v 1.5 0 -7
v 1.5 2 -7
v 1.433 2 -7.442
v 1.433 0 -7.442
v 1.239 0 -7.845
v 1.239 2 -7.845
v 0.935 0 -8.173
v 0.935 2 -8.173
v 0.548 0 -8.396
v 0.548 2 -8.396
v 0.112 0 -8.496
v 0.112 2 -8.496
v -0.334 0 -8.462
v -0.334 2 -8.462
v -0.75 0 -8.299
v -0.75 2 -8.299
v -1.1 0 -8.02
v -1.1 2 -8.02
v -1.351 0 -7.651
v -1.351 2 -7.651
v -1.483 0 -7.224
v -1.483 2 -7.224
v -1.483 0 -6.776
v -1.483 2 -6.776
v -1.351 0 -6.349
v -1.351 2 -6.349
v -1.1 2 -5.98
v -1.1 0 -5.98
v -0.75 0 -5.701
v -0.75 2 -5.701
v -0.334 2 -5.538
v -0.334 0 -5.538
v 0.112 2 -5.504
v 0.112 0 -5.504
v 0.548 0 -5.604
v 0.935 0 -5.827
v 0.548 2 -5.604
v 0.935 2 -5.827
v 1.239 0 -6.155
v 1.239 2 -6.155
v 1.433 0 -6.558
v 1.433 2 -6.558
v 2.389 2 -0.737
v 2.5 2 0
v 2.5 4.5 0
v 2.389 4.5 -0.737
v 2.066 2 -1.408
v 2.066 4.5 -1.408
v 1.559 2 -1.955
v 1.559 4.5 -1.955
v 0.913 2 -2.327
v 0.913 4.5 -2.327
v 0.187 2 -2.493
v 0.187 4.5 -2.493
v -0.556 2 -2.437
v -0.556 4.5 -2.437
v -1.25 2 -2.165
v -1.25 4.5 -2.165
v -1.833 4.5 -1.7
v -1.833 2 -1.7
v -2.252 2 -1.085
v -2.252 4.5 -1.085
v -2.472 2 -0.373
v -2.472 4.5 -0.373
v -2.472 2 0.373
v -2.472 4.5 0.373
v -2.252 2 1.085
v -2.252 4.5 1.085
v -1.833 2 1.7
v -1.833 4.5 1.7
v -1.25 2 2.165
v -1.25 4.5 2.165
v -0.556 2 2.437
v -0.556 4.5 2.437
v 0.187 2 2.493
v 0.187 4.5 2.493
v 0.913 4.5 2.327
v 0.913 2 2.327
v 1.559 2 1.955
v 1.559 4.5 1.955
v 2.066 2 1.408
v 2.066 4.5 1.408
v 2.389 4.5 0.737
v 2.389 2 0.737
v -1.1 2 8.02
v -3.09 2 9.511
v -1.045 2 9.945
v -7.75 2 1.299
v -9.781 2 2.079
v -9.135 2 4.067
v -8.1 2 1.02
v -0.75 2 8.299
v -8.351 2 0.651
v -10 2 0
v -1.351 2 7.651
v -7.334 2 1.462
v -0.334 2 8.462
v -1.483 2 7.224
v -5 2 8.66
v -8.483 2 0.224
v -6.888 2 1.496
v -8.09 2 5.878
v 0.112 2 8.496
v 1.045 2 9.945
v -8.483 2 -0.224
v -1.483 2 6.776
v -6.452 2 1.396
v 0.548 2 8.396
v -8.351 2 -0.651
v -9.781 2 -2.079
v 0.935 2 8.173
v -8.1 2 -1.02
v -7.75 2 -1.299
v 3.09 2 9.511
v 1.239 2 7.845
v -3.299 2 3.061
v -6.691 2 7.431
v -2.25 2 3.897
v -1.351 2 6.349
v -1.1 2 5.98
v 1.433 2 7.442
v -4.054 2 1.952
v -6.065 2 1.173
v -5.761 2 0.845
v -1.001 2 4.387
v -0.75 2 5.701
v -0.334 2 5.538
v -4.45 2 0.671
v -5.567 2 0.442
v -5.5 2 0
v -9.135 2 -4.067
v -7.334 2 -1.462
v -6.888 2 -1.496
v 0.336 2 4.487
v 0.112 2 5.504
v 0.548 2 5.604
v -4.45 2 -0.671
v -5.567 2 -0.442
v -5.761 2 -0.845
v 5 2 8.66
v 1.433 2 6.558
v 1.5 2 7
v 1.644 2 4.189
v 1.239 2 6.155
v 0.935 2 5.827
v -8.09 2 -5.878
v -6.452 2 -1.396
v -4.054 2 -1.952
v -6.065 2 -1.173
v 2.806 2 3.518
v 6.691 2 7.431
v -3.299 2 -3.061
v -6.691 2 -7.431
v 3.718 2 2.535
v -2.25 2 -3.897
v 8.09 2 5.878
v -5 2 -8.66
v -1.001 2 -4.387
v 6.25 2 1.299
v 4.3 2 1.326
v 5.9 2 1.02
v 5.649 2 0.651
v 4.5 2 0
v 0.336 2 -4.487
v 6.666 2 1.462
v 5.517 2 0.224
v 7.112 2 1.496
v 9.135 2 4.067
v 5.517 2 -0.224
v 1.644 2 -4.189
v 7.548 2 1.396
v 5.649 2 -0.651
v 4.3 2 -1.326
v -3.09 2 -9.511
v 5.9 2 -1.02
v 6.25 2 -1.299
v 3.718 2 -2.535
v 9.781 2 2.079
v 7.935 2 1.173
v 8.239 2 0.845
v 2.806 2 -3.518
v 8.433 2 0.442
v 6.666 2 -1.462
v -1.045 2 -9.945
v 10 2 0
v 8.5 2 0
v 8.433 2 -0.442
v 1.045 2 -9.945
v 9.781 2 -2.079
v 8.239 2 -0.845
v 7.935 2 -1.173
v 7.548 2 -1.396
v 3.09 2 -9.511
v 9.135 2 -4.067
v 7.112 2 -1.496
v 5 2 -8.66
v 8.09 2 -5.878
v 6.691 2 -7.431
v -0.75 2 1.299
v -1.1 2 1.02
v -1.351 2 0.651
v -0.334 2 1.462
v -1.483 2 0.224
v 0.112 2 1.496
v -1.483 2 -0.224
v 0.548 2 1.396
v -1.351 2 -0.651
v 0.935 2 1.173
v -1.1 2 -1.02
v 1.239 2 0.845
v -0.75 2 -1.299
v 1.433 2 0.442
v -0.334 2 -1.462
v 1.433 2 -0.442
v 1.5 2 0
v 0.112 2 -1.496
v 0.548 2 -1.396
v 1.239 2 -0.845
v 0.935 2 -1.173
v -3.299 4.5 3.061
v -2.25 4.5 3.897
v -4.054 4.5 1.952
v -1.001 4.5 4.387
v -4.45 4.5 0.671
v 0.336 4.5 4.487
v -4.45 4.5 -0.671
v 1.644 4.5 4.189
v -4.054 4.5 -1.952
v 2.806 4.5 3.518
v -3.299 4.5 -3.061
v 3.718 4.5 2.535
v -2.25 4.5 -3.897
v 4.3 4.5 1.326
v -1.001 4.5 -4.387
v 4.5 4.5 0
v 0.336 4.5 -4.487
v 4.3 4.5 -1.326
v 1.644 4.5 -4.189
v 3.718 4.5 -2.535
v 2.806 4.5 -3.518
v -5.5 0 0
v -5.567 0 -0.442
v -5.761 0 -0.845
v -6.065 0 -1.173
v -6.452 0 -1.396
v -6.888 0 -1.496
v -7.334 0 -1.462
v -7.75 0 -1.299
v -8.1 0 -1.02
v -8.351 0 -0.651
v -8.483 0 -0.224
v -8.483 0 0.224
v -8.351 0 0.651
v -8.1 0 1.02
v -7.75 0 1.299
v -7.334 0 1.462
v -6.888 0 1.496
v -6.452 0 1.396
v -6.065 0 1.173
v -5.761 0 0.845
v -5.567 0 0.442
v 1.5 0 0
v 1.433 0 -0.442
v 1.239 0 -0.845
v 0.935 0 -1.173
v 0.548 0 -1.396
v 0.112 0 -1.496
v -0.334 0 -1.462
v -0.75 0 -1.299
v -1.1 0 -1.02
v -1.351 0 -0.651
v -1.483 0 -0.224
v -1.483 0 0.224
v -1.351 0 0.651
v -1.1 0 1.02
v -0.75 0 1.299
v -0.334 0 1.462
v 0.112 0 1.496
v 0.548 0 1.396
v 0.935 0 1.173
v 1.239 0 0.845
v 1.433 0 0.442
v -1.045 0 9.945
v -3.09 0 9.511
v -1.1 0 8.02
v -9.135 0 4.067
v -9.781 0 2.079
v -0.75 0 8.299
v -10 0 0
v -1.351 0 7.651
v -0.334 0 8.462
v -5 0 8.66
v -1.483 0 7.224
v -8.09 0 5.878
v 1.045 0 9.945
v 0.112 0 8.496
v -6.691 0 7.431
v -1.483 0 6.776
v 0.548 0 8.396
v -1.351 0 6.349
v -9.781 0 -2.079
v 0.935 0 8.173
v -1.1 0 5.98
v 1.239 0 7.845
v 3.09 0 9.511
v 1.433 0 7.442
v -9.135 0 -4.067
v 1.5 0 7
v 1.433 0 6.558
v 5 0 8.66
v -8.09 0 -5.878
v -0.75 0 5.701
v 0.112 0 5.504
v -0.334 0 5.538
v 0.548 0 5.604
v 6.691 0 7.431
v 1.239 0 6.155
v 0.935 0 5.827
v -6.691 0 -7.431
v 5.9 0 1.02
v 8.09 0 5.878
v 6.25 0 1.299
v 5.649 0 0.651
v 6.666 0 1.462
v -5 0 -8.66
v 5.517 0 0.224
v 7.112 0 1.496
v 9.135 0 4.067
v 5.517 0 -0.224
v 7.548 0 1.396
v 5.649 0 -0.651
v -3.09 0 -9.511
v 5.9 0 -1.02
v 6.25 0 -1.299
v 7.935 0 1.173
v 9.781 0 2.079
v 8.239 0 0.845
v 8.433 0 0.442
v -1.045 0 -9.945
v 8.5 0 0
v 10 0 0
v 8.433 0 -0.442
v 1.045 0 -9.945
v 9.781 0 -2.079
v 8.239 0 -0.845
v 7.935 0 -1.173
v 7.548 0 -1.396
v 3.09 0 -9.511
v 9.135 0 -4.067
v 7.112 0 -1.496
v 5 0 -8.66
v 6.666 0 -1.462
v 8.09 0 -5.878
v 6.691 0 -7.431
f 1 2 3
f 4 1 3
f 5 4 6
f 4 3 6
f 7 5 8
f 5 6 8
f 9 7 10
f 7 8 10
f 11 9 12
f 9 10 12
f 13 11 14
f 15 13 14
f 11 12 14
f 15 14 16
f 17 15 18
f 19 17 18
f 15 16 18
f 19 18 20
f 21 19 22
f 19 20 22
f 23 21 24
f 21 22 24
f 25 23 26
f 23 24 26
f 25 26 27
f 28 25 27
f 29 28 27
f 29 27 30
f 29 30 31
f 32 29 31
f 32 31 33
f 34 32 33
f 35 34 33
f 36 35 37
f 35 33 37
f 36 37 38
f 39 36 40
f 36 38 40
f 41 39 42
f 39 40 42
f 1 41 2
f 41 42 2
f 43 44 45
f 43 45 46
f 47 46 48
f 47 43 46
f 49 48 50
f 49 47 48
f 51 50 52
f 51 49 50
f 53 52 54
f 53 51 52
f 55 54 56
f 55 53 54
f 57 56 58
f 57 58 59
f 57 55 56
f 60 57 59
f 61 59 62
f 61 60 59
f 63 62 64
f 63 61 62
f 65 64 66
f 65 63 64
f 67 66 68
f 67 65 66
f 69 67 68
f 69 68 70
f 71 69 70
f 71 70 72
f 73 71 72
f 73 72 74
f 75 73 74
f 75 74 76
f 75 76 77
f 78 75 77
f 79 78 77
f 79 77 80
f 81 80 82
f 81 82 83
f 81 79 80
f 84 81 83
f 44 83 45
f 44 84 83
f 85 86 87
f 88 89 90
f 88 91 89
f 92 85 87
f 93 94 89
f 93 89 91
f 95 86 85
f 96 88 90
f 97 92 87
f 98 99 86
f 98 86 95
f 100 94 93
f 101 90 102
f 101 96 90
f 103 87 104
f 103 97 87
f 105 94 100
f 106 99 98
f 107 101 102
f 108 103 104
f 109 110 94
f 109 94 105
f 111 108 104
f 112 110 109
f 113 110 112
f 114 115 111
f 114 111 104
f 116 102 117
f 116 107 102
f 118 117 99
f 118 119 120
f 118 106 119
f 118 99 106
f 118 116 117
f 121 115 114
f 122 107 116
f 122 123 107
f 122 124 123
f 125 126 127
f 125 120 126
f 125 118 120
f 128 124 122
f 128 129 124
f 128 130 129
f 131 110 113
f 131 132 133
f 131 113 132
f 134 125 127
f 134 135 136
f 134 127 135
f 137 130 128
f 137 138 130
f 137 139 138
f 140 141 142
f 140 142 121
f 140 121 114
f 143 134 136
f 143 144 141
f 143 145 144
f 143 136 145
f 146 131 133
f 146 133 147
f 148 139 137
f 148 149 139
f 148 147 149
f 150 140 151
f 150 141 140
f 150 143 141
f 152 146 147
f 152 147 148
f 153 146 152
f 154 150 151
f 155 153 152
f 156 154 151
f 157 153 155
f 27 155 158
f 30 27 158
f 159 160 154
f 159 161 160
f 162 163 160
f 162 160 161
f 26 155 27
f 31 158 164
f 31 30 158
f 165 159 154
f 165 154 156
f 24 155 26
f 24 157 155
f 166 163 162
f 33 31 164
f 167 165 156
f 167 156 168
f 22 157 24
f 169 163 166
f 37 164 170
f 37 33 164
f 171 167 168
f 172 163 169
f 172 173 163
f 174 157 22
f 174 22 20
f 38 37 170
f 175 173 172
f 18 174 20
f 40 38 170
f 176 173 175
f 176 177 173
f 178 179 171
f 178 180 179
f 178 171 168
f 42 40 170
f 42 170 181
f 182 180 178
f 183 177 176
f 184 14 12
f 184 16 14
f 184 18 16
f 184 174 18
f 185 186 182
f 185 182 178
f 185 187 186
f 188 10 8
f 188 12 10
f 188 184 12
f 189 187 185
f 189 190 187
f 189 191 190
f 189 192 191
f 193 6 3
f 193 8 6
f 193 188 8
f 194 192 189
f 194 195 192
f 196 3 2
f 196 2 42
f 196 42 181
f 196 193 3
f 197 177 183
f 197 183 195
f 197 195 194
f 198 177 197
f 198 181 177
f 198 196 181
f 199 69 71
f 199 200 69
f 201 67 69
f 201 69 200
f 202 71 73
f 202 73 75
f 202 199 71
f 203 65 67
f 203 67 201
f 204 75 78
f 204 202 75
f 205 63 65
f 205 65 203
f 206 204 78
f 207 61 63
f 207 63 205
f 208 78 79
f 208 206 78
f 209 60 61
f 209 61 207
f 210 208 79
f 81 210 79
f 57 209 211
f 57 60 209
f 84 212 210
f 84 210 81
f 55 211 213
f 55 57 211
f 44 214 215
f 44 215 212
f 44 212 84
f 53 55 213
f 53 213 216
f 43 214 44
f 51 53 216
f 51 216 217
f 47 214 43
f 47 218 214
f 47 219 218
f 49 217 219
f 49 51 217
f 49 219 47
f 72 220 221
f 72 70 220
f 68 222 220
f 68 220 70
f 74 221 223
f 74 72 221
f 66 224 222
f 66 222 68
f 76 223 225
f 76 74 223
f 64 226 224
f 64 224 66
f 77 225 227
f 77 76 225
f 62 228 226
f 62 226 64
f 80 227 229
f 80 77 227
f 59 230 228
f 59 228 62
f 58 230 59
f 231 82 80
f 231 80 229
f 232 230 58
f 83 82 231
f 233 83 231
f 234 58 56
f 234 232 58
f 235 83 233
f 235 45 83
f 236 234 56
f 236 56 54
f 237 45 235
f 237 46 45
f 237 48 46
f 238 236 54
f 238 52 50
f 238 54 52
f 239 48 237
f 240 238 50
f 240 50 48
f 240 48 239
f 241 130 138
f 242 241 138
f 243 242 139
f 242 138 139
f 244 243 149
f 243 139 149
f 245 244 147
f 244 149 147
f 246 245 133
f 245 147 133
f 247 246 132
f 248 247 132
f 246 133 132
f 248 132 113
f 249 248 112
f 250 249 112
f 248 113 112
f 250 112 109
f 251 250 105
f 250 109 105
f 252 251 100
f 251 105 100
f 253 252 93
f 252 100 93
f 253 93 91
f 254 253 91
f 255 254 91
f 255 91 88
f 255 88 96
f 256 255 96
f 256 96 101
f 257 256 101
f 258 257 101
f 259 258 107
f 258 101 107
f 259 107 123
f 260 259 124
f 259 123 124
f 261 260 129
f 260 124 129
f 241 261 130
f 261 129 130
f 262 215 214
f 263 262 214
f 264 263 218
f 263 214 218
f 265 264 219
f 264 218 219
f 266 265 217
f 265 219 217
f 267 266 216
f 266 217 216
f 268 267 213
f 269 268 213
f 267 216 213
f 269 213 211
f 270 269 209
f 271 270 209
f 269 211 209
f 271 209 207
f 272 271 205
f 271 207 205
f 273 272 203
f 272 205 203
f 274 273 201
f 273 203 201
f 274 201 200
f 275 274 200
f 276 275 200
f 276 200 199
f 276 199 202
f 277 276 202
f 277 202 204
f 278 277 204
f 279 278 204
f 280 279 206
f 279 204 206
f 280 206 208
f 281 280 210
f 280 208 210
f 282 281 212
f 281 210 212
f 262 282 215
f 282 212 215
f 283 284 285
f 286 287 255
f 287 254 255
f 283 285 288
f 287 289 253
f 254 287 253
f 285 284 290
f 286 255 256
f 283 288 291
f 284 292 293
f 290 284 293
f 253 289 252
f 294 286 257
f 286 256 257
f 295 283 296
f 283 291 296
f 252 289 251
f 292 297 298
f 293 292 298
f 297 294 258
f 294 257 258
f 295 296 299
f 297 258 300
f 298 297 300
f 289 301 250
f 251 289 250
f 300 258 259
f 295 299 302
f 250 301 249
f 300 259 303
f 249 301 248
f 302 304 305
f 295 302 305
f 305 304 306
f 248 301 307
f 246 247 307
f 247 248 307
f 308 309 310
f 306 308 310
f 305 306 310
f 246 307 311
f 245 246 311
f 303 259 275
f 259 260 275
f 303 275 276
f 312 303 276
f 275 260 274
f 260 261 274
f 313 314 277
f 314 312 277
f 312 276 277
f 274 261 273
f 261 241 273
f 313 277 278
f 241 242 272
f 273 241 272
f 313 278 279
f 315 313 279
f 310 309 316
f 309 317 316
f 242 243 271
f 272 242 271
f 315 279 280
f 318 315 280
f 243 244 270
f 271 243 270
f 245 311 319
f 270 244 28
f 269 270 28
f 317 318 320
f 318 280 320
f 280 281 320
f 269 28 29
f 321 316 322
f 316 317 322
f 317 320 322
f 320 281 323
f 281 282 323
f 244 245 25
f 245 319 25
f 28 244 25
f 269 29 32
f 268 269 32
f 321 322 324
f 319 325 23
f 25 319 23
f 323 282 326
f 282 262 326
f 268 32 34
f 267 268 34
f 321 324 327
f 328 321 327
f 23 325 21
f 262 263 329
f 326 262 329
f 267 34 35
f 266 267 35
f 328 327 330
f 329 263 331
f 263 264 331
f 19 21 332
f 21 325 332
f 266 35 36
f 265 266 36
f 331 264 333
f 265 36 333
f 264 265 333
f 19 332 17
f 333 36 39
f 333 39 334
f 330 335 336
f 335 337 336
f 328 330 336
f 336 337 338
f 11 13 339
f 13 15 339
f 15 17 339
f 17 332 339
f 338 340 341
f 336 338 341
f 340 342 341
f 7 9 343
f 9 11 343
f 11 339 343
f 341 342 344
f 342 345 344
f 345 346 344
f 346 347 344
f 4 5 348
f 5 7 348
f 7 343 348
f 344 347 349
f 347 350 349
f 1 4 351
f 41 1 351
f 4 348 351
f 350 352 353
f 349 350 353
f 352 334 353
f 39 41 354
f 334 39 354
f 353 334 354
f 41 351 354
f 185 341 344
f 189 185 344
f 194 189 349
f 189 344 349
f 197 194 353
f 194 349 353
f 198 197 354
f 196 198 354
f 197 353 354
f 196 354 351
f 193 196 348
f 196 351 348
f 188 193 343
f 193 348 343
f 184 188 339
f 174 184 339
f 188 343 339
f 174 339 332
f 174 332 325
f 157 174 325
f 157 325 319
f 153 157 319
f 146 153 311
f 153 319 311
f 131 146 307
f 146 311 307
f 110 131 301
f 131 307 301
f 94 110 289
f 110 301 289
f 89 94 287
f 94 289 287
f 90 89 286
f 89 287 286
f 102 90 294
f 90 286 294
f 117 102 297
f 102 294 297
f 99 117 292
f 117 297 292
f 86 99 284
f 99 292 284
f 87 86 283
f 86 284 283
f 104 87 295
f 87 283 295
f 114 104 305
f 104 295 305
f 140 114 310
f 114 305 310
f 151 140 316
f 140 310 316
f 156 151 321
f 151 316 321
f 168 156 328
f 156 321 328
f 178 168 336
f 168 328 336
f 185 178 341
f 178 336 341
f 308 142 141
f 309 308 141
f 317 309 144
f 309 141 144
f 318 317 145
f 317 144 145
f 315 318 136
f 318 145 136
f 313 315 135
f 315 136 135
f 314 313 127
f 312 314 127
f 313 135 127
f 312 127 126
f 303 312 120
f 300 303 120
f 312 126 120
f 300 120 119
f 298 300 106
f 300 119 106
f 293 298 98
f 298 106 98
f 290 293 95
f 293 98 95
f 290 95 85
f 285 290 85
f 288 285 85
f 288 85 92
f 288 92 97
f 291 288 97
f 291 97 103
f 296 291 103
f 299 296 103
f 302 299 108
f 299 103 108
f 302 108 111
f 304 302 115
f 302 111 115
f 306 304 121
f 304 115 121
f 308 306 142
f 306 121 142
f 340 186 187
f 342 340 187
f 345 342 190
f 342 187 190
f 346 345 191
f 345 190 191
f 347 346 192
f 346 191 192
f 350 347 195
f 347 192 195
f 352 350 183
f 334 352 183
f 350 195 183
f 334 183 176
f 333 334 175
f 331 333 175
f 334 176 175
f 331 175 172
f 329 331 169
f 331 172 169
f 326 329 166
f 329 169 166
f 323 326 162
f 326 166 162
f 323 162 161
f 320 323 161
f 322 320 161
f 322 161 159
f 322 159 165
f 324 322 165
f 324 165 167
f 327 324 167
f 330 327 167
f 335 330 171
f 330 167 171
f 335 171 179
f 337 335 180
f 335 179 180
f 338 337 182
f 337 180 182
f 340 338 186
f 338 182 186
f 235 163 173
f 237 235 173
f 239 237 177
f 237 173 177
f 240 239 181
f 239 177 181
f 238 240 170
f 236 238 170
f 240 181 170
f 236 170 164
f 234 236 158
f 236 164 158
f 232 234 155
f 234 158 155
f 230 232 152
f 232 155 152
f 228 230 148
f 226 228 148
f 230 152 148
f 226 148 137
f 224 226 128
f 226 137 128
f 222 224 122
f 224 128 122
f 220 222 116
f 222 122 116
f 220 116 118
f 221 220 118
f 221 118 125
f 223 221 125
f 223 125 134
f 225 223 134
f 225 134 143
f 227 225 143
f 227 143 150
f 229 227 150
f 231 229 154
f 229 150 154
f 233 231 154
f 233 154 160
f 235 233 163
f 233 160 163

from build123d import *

# Parameters (mm, degrees)
SKETCH_1_R          = 10
EXTRUDE_1_DEPTH     = 2
SKETCH_2_R          = 1.5
CUT_EXTRUDE_1_DEPTH = 2
SKETCH_3_R          = 4.5
SKETCH_3_R_2        = 2.5
EXTRUDE_2_DEPTH     = 2.5


with BuildPart() as part:
    # 草图1 → 凸台-拉伸1 (new body)
    with BuildSketch(Plane(origin=(0, 0, 0), x_dir=(1, 0, 0), z_dir=(0, 1, 0))):
        Circle(SKETCH_1_R)
    extrude(amount=EXTRUDE_1_DEPTH)

    # 草图2 → 切除-拉伸1 (cut)
    with BuildSketch(Plane(origin=(0, 2, 0), x_dir=(1, 0, 0), z_dir=(0, 1, 0))):
        Circle(SKETCH_2_R)
        with Locations((0, 7)):
            Circle(SKETCH_2_R)
        with Locations((7, 0)):
            Circle(SKETCH_2_R)
        with Locations((0, -7)):
            Circle(SKETCH_2_R)
        with Locations((-7, 0)):
            Circle(SKETCH_2_R)
    extrude(amount=-CUT_EXTRUDE_1_DEPTH, mode=Mode.SUBTRACT)

    # 草图3 → 凸台-拉伸2 (add)
    with BuildSketch(Plane(origin=(0, 2, 0), x_dir=(1, 0, 0), z_dir=(0, 1, 0))):
        Circle(SKETCH_3_R)
        Circle(SKETCH_3_R_2, mode=Mode.SUBTRACT)
    extrude(amount=EXTRUDE_2_DEPTH)


solid = part.part
